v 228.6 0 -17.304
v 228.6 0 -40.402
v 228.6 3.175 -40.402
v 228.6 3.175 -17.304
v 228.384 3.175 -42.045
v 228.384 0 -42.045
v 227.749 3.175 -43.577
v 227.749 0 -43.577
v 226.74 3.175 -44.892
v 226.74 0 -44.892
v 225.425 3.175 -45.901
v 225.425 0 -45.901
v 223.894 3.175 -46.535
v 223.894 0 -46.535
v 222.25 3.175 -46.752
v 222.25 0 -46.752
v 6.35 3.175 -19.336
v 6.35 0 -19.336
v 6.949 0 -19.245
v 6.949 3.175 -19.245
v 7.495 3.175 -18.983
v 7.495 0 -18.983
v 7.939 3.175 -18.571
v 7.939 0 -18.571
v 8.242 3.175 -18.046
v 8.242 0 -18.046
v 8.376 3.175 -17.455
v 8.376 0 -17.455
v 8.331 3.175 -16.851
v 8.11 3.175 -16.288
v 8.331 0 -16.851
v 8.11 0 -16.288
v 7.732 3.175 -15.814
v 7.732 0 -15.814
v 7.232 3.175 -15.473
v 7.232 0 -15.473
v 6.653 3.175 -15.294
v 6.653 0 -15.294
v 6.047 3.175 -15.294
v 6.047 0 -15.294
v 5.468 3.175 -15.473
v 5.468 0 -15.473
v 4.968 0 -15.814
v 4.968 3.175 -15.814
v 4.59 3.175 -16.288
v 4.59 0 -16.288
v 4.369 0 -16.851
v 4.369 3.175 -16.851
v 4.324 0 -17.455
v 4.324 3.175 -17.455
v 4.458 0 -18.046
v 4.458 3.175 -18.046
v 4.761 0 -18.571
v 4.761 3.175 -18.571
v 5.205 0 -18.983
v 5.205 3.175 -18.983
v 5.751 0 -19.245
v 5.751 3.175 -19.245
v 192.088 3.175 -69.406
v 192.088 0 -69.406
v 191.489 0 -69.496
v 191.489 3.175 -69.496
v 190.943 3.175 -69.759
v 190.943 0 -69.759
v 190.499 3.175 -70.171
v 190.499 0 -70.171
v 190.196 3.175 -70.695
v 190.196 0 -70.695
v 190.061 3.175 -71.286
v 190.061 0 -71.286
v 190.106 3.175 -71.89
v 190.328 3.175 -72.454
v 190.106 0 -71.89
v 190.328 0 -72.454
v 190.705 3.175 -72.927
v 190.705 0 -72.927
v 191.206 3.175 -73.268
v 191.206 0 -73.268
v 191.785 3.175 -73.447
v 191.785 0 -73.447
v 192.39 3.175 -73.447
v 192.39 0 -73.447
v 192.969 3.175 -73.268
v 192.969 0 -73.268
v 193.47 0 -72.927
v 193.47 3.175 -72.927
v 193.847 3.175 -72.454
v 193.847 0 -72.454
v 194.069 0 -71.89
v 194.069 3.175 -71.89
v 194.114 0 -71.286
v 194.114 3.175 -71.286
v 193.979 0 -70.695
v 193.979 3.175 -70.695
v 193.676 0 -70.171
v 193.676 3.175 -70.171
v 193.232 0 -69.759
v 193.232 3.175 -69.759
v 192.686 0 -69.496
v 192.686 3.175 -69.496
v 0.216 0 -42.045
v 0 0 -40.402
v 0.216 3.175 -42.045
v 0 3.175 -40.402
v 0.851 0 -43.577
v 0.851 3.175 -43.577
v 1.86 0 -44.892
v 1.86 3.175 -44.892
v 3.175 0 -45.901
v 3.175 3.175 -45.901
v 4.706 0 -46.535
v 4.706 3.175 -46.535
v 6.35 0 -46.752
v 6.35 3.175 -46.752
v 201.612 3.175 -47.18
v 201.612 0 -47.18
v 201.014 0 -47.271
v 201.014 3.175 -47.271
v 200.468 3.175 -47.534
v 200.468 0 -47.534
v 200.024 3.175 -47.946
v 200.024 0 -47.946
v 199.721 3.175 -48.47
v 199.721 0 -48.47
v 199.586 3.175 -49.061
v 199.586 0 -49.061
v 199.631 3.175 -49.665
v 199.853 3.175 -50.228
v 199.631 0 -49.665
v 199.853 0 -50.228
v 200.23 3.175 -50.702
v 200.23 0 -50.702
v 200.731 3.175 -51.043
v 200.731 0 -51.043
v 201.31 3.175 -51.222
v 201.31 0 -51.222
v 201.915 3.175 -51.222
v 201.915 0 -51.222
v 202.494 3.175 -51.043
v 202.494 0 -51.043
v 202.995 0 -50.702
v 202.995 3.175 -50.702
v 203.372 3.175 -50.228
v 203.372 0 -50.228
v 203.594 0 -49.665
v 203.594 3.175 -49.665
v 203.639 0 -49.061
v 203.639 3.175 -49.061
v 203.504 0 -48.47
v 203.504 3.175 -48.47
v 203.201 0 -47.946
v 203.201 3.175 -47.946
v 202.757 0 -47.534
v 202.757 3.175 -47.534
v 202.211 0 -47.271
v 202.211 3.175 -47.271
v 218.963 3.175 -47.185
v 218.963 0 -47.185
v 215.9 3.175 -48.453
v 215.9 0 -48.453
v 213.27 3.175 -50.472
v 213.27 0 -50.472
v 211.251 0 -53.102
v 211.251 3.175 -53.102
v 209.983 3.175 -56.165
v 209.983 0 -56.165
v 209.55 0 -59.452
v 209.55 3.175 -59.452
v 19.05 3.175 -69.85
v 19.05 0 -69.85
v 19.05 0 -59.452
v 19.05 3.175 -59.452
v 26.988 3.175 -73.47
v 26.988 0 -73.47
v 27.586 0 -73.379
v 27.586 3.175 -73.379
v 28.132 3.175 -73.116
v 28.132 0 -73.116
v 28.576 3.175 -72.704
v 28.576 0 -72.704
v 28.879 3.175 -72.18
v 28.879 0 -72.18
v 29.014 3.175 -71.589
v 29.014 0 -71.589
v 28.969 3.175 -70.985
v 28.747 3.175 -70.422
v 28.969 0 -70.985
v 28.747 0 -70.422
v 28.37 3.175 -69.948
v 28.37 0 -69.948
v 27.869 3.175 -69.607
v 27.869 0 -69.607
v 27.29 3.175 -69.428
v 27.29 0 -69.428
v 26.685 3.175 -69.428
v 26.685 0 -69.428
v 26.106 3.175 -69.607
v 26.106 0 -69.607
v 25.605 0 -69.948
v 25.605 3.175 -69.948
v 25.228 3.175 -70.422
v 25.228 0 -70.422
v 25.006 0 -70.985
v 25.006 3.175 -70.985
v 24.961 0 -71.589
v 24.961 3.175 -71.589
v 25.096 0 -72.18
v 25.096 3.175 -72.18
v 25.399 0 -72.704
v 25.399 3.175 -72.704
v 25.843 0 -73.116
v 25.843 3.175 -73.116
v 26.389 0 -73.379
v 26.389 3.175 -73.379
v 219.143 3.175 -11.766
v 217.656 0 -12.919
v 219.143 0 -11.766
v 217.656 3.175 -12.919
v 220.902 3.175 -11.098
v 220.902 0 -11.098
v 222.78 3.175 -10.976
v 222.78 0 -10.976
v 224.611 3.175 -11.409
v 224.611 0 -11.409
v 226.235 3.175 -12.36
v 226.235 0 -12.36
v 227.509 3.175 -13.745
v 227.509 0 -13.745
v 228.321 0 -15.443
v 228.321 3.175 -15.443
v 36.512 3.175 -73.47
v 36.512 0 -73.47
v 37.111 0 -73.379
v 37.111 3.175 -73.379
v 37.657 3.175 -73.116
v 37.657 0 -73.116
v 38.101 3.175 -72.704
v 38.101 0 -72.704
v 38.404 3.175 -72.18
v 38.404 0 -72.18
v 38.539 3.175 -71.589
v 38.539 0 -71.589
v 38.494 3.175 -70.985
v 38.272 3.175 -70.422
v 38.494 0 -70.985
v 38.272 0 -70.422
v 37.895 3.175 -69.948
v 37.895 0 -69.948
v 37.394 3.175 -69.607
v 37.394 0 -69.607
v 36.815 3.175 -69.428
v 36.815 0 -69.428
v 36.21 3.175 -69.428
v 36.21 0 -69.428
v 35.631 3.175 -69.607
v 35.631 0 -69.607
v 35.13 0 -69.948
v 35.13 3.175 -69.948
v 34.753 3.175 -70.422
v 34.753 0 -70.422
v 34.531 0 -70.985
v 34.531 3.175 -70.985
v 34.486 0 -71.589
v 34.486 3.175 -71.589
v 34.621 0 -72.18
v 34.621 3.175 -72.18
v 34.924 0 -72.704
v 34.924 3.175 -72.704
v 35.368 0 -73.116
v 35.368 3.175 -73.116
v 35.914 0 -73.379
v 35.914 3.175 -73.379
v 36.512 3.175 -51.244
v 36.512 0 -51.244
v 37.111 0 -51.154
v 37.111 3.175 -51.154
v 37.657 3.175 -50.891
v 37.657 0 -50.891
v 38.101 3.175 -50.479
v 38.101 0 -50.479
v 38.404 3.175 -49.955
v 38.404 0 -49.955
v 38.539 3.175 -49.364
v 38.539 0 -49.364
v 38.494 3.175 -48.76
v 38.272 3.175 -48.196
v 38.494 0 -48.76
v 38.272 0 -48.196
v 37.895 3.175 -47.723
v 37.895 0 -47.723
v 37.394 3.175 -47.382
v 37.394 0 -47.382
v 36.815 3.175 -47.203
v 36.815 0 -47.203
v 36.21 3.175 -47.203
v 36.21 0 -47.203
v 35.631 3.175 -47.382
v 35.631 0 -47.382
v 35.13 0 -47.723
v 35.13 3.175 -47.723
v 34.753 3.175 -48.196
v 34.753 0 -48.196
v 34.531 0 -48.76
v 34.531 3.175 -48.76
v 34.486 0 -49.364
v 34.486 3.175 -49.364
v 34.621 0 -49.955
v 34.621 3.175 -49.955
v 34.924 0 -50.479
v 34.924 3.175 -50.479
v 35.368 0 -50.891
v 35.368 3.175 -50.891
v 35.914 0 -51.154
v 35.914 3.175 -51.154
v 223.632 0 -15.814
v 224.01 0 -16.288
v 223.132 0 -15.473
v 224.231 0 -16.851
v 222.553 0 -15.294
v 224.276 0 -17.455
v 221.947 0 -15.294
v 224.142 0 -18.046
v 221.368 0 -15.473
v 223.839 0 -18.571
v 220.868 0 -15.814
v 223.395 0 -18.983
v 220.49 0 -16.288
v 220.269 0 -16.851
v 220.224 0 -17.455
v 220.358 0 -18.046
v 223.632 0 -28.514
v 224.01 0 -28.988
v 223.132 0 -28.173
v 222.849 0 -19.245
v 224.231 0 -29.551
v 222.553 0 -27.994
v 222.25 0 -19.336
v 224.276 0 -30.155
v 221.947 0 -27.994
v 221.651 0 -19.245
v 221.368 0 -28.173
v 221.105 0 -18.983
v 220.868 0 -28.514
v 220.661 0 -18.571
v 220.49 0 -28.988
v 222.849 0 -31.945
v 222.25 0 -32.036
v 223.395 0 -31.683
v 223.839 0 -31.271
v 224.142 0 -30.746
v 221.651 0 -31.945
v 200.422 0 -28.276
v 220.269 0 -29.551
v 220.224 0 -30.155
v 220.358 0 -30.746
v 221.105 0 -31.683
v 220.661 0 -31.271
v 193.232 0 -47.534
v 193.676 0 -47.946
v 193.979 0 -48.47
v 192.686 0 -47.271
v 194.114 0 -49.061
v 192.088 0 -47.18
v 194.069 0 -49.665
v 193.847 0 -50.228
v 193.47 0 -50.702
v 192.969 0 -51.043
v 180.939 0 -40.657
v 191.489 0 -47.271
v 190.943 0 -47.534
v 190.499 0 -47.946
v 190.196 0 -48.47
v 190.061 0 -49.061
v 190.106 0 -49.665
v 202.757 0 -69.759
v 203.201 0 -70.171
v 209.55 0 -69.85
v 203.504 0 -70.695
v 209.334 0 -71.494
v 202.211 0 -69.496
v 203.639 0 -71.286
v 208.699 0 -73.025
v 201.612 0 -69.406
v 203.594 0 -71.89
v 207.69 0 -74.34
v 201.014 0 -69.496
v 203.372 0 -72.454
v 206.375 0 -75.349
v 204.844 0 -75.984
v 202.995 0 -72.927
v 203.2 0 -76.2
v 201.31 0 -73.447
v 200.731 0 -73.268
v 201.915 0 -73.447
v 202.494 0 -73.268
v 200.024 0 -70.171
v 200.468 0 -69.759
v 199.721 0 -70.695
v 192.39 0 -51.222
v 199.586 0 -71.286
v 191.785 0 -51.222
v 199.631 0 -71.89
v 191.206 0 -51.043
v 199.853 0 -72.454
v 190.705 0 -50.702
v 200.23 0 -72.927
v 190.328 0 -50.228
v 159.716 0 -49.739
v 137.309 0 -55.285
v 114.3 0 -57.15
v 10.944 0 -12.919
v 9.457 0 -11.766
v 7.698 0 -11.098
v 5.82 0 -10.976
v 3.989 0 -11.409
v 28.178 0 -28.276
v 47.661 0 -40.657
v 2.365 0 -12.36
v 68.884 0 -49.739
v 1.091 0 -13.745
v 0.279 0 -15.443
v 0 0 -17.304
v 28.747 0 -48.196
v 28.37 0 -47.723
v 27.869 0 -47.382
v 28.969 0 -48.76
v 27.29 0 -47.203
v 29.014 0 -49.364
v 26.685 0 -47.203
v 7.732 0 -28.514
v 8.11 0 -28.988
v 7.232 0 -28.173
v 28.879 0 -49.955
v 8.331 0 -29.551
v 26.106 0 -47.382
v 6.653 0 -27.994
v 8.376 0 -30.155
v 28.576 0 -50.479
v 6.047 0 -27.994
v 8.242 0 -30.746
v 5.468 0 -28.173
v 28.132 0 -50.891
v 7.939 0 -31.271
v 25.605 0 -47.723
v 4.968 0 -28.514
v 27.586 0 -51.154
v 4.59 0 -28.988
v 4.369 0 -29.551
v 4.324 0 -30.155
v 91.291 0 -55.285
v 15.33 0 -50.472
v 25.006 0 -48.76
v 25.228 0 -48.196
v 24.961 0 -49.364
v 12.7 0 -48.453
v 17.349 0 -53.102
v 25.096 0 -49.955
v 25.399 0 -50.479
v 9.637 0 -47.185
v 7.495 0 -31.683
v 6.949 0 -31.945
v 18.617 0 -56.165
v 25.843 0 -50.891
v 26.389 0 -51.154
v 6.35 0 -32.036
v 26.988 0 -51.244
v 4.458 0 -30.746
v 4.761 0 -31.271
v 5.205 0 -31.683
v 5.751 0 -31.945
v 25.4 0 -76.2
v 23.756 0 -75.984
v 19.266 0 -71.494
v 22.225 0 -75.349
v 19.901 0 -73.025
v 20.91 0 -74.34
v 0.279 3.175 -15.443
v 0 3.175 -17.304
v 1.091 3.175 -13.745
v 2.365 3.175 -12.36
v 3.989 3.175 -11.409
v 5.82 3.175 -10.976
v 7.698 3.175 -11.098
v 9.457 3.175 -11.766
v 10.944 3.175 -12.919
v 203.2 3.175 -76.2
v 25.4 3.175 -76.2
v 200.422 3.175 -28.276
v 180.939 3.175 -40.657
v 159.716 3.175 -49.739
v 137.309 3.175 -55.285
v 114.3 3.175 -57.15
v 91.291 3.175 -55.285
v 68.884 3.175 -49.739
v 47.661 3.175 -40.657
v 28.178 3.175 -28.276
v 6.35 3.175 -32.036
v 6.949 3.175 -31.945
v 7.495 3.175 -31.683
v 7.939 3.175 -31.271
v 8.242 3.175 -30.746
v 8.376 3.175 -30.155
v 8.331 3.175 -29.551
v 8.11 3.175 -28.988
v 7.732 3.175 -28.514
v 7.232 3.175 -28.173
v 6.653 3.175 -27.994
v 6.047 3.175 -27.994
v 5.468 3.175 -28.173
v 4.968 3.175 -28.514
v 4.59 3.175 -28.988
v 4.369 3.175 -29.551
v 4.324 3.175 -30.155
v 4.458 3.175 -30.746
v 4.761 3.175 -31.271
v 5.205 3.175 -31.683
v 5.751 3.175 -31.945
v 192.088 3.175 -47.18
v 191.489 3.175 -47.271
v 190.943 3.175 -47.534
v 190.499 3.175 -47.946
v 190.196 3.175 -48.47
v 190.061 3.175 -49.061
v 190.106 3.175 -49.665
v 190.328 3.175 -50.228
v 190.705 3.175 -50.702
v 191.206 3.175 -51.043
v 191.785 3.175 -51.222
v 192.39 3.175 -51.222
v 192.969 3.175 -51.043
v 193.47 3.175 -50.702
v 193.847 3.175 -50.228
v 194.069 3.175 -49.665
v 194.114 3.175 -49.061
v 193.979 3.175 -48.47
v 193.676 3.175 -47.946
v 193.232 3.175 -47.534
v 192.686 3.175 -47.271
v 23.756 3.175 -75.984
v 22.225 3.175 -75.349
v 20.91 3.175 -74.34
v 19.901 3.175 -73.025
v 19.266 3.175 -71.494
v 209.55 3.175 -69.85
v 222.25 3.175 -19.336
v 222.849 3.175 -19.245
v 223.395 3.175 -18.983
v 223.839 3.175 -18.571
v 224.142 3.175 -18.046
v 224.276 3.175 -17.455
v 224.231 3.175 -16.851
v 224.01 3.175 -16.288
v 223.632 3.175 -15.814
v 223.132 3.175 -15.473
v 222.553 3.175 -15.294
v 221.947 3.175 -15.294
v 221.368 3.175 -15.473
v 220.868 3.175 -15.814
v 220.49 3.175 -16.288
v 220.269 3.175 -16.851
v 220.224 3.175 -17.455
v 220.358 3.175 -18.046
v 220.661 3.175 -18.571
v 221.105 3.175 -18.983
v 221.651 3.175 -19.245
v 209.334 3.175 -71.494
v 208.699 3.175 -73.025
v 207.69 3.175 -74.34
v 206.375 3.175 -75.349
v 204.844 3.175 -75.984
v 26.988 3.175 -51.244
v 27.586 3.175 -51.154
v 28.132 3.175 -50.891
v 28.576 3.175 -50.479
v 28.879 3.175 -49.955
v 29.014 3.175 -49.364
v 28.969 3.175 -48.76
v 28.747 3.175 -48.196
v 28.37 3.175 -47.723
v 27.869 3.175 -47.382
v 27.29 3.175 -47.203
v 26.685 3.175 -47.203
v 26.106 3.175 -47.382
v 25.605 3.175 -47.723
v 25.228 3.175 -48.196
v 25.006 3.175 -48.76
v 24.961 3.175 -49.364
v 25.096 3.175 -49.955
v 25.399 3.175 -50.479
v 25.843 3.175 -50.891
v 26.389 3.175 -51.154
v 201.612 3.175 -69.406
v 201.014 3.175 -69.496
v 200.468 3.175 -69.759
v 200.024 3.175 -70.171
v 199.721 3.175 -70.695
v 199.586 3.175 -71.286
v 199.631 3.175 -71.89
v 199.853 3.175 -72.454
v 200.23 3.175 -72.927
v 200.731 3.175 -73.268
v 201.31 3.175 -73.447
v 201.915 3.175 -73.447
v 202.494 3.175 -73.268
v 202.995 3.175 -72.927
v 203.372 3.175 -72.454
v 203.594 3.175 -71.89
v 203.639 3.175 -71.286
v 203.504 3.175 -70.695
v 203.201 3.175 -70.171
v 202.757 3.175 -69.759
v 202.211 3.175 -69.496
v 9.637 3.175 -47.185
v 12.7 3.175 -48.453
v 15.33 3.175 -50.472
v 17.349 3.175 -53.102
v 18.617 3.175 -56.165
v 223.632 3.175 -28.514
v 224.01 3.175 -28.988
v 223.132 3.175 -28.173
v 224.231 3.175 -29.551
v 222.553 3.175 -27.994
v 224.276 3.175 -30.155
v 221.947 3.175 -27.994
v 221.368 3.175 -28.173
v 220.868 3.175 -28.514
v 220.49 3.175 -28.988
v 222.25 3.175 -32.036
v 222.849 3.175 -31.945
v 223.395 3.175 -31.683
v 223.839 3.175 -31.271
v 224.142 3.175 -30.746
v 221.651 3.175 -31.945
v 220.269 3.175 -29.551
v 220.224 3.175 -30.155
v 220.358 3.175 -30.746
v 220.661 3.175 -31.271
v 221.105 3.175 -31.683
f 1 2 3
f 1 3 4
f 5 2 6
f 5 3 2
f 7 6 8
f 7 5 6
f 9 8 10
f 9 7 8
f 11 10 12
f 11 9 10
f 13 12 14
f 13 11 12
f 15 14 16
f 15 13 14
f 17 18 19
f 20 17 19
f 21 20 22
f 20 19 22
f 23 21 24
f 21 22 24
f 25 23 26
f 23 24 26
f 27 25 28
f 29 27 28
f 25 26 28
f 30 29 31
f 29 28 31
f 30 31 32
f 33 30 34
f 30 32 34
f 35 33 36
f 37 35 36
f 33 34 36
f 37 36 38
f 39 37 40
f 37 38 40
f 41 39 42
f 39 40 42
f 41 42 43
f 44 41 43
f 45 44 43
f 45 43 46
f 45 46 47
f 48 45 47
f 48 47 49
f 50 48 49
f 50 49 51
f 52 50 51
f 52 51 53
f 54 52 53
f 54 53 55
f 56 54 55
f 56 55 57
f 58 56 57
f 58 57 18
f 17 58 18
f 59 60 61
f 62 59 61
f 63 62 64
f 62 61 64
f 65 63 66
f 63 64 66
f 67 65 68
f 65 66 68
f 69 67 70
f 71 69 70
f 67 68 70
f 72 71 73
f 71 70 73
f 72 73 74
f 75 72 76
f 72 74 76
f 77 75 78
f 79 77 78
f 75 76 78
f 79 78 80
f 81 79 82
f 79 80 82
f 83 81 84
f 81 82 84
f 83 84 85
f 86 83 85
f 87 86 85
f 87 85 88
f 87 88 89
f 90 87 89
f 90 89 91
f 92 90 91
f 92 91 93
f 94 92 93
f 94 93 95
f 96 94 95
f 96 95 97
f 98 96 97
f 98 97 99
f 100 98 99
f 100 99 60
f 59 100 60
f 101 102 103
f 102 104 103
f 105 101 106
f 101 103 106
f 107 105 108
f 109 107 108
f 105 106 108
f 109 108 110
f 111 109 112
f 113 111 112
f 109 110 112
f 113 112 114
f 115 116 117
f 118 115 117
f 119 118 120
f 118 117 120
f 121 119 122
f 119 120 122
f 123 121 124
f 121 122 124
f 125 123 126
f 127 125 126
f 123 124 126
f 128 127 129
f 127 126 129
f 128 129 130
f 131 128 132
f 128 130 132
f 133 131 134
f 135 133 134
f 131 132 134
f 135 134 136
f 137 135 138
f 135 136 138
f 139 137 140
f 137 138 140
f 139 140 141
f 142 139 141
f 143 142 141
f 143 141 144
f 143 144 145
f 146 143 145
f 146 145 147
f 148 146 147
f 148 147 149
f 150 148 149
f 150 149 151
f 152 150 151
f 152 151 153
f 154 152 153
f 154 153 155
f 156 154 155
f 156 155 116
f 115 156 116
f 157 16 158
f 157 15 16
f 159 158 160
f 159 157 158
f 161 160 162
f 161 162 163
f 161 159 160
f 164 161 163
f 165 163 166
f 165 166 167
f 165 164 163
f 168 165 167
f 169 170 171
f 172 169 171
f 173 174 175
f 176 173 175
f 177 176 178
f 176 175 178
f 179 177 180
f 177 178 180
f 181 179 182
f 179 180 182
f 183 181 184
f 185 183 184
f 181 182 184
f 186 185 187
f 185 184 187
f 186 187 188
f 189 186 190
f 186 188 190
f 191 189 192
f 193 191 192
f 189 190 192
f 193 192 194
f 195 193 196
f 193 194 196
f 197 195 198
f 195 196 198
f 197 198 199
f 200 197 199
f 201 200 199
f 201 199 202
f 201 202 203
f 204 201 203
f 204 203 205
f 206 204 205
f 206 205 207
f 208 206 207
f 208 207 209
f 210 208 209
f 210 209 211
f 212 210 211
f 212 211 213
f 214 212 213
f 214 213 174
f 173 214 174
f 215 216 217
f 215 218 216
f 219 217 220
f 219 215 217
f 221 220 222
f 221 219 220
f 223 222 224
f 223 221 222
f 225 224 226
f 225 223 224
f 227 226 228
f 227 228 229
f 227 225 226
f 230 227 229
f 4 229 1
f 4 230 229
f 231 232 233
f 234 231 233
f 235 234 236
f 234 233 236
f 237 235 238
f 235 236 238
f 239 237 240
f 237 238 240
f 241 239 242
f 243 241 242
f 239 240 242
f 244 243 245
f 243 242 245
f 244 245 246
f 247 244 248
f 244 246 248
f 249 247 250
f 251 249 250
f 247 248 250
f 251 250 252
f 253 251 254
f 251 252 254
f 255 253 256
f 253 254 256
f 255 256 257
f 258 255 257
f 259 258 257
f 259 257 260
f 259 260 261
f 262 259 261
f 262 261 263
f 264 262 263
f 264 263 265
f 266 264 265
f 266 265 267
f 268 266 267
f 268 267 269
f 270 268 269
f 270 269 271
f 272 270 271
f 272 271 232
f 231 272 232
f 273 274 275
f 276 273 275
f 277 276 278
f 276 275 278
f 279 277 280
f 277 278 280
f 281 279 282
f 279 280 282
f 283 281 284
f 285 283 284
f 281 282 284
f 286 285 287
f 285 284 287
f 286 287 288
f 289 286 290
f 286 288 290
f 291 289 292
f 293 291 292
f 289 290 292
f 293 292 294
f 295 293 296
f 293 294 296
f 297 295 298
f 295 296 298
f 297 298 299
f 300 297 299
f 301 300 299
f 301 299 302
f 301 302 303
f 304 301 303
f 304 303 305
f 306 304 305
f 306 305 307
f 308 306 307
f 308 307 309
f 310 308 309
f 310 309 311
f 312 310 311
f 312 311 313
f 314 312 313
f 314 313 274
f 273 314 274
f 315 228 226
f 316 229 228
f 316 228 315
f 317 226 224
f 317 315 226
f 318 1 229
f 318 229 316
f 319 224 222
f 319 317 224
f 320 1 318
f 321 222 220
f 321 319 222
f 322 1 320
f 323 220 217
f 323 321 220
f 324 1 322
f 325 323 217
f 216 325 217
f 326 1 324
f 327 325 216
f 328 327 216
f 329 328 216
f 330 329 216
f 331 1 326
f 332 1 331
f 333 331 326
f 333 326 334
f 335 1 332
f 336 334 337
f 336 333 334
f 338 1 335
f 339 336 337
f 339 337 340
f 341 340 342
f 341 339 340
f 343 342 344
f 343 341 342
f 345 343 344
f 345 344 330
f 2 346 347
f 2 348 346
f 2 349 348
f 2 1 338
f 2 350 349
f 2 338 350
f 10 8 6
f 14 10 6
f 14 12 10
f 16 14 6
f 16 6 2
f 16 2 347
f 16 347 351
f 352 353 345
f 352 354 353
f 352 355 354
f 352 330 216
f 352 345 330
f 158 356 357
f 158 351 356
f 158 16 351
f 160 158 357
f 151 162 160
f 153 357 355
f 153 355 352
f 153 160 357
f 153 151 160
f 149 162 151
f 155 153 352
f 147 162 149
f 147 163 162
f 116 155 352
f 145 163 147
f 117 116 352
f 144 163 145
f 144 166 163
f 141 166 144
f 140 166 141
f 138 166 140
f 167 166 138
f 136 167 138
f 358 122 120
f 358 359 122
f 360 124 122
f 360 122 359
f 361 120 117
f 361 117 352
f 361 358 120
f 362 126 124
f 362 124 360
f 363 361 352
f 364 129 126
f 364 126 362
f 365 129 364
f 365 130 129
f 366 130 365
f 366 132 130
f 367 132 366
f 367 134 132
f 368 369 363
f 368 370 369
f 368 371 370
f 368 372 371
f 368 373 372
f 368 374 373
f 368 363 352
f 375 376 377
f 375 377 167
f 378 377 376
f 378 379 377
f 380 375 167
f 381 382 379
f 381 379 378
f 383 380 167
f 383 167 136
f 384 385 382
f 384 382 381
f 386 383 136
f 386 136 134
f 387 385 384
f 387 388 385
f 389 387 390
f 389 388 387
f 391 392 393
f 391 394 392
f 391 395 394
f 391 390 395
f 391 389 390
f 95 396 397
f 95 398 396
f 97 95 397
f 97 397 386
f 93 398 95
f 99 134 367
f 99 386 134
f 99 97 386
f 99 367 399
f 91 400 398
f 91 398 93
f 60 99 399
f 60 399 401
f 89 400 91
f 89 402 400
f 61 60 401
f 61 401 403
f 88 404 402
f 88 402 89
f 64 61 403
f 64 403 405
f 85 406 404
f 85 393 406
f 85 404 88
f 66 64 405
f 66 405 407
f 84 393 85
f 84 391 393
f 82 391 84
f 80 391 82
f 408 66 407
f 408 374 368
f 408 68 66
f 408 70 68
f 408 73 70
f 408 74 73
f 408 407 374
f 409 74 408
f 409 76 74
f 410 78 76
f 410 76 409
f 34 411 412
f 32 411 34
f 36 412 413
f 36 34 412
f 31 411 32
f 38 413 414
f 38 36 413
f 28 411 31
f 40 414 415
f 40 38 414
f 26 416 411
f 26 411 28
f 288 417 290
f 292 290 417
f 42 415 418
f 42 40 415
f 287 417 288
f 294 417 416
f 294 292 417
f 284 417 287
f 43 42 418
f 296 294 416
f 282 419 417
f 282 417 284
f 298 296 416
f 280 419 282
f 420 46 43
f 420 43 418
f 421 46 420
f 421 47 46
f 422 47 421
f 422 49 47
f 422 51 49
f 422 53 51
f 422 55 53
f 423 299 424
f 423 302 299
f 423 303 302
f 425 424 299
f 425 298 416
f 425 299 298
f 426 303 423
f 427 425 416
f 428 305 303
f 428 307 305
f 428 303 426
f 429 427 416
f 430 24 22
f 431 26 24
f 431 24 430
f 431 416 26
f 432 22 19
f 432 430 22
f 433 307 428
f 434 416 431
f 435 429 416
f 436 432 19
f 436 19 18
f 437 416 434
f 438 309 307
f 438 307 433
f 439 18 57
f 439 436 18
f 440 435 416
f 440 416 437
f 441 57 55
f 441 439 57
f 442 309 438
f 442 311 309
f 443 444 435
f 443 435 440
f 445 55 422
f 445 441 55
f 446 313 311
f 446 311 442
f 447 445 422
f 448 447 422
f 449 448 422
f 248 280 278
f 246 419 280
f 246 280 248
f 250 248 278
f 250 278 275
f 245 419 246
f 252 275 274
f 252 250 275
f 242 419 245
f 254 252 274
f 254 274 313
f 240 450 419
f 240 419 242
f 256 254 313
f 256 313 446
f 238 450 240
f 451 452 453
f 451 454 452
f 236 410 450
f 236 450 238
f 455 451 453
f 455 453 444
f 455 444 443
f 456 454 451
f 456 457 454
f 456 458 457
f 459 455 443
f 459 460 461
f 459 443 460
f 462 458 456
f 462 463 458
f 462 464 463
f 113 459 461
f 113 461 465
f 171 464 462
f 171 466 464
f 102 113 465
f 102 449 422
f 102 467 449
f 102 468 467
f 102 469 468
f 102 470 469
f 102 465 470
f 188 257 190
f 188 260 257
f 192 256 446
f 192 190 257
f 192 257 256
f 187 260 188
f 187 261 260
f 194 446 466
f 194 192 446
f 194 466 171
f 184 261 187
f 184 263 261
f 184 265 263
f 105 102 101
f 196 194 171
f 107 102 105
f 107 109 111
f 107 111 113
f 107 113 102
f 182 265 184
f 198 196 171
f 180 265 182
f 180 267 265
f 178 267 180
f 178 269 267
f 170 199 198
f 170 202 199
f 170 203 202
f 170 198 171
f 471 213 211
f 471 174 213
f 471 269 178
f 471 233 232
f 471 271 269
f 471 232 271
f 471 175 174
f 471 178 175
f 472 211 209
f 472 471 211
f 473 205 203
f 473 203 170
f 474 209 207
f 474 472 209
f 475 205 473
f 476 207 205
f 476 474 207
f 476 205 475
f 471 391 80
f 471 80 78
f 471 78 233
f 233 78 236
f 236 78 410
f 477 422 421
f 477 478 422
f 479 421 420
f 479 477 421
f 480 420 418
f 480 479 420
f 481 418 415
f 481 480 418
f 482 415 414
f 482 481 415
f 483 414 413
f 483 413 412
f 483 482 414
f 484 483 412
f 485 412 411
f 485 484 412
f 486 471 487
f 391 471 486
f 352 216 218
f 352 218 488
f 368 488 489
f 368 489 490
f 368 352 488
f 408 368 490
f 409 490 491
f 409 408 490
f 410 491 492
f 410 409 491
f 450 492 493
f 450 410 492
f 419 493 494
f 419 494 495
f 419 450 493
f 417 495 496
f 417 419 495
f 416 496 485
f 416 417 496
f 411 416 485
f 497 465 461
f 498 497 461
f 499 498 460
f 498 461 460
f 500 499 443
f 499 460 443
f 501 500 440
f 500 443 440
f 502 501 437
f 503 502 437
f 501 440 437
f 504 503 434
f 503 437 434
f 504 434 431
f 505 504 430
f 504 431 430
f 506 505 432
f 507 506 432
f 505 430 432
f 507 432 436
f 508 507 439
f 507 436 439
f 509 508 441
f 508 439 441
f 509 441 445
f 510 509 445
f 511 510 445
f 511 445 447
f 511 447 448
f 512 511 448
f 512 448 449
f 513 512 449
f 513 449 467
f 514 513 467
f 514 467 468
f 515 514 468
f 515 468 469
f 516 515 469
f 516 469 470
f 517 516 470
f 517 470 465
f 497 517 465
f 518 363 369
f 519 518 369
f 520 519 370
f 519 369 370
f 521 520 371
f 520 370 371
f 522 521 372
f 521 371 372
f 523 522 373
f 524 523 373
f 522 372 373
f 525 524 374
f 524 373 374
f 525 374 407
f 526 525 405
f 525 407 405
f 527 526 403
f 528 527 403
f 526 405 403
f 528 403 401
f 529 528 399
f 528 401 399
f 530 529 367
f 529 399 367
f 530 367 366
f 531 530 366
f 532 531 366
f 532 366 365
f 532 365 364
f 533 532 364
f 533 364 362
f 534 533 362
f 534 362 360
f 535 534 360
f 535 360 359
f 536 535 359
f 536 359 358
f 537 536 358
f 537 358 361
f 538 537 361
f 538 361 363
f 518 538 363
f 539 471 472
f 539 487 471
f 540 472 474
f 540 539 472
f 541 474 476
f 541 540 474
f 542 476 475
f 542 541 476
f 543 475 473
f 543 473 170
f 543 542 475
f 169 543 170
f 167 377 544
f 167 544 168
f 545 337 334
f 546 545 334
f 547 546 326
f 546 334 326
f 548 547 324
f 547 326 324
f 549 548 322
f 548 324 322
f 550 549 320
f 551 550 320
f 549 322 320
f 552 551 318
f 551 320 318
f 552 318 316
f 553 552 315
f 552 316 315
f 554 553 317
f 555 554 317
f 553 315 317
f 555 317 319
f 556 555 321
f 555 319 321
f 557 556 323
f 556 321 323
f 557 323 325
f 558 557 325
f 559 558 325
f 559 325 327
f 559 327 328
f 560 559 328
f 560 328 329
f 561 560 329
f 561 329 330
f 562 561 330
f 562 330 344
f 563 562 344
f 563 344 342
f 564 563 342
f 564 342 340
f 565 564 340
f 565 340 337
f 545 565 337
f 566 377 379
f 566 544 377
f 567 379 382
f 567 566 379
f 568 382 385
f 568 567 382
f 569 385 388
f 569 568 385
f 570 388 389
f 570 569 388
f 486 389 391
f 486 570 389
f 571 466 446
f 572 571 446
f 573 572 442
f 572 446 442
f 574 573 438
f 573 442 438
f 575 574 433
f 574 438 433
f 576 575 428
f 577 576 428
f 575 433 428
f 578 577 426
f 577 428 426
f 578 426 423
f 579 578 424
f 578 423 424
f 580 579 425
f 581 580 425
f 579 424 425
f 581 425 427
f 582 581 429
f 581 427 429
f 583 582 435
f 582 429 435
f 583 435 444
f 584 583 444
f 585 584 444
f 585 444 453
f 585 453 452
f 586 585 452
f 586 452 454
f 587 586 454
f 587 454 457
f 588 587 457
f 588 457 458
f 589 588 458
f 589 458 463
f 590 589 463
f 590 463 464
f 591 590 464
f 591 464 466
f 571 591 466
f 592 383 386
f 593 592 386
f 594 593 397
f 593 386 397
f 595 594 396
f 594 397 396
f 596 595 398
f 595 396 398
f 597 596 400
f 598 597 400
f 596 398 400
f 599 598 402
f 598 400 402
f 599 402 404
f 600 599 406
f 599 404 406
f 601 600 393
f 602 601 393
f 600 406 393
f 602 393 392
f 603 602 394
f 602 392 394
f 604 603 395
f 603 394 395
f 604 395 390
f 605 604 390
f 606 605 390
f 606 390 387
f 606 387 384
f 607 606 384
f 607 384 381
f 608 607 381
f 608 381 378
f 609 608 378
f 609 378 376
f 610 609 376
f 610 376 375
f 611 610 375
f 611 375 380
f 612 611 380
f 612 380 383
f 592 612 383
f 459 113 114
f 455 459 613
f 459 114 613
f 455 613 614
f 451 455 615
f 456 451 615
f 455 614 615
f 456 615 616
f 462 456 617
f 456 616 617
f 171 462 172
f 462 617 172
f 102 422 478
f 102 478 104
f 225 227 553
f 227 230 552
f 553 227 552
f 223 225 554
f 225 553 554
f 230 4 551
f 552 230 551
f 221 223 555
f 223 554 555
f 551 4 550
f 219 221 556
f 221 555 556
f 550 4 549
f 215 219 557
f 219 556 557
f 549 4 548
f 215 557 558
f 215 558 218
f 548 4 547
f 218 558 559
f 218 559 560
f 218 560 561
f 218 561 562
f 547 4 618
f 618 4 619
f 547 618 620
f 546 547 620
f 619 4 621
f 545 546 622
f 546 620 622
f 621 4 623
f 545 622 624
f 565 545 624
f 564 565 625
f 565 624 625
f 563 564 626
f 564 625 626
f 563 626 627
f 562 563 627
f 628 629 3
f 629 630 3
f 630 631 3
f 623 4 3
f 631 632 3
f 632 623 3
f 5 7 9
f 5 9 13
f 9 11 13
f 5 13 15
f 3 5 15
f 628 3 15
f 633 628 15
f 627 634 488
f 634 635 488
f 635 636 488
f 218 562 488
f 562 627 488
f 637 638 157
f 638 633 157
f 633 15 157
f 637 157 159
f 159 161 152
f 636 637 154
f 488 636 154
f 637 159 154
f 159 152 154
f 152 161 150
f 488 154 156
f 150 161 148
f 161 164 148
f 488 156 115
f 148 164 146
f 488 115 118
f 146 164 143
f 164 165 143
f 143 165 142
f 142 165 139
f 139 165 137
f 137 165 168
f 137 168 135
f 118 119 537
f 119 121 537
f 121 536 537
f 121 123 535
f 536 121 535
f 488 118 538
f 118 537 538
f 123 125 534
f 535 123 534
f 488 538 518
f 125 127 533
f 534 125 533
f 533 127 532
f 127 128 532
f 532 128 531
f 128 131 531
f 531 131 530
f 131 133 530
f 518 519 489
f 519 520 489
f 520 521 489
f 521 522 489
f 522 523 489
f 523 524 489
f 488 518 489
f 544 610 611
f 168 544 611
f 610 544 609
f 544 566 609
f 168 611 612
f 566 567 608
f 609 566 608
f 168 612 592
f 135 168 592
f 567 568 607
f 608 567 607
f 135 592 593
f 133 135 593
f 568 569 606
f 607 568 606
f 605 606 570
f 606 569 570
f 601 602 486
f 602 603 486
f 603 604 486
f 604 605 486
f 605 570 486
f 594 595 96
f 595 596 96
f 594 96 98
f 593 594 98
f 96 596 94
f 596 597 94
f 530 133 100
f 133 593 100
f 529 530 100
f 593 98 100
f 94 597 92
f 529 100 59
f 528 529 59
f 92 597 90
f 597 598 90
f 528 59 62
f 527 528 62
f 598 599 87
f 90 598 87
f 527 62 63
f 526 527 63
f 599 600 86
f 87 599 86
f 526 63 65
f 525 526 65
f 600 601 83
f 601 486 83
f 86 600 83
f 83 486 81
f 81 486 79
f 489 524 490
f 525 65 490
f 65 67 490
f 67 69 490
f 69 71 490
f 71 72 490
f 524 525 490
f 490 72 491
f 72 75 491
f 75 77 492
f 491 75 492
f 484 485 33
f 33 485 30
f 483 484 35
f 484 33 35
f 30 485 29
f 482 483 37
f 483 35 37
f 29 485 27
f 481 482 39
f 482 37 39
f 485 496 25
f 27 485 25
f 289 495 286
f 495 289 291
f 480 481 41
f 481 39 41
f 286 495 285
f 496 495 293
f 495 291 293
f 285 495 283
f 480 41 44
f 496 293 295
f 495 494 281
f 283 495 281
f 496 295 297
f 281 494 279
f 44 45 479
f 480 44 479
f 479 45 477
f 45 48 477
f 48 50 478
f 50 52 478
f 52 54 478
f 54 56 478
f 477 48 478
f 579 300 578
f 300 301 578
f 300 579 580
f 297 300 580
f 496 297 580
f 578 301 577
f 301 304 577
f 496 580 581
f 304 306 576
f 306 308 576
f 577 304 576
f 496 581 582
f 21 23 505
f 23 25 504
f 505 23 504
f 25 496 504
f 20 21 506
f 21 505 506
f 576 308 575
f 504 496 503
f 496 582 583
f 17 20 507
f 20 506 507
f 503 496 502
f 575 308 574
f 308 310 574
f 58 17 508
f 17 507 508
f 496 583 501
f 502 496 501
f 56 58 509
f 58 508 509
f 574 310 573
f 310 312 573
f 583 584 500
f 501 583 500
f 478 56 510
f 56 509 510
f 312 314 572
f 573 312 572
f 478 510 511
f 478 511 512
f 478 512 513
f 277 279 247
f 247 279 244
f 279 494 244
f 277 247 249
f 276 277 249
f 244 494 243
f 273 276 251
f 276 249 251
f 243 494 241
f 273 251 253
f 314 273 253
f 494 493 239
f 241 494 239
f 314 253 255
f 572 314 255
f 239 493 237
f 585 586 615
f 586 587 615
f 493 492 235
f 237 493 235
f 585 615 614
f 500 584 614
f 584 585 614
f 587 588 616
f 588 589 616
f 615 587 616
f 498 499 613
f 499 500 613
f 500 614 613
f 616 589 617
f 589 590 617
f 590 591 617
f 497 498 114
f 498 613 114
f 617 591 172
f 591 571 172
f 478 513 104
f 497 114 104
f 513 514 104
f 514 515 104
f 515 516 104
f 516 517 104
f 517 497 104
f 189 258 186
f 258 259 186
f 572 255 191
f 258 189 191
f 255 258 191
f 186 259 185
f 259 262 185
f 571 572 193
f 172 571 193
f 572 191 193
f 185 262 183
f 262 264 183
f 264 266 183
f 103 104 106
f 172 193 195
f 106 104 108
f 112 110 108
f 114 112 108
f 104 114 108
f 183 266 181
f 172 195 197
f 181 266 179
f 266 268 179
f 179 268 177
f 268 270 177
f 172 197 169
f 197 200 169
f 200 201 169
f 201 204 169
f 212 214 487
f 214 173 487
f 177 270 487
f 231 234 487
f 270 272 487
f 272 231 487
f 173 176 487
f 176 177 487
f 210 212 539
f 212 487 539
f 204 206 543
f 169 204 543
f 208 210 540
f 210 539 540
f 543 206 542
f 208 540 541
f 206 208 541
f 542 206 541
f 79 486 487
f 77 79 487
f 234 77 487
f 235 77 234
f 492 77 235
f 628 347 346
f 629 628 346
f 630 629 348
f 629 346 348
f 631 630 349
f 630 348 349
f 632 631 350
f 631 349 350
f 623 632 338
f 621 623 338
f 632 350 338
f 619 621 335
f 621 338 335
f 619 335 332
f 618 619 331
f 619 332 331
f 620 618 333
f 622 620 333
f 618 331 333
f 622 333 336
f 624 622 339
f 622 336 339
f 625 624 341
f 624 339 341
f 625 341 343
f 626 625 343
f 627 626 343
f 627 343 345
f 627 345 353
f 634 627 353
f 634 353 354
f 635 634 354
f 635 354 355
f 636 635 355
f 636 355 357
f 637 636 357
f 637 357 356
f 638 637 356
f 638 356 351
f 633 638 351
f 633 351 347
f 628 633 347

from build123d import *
from OCP.BRepFilletAPI import BRepFilletAPI_MakeFillet

# Parameters (mm, degrees)
BOSS_EXTRUDE1_DEPTH = 3.175
SKETCH3_R           = 2.032
CUT_EXTRUDE1_DEPTH  = 241.986473946
FILLET1_R           = 6.35
SKETCH4_R           = 2.032
SKETCH4_W           = 19.05
SKETCH4_H           = 29.448186152
CUT_EXTRUDE2_DEPTH  = 241.986473946
FILLET2_R           = 12.7
FILLET2_R_2         = 6.35


with BuildPart() as part:
    # Sketch1 → Boss-Extrude1 (new body)
    with BuildSketch(Plane(origin=(0, 0, 0), x_dir=(1, 0, 0), z_dir=(0, 1, 0))):
        with BuildLine():
            Line((0, 0), (0, 76.2))
            Line((0, 76.2), (228.6, 76.2))
            Line((228.6, 76.2), (228.6, 0))
            ThreePointArc((228.6, 0), (114.3, 57.15), (0, 0))
        make_face()
    extrude(amount=BOSS_EXTRUDE1_DEPTH)

    # Sketch3 → Cut-Extrude1 (cut, through all)
    with BuildSketch(Plane.XZ):
        with Locations(Location((36.5125, -49.2125, 0), (0, 0, 270))):
            Circle(SKETCH3_R)
        with Locations(Location((26.9875, -49.2125, 0), (0, 0, 270))):
            Circle(SKETCH3_R)
        with Locations(Location((201.6125, -49.2125, 0), (0, 0, 90))):
            Circle(SKETCH3_R)
        with Locations(Location((192.0875, -49.2125, 0), (0, 0, 90))):
            Circle(SKETCH3_R)
        with Locations(Location((36.5125, -71.4375, 0), (0, 0, 270))):
            Circle(SKETCH3_R)
        with Locations(Location((26.9875, -71.4375, 0), (0, 0, 270))):
            Circle(SKETCH3_R)
        with Locations(Location((201.6125, -71.4375, 0), (0, 0, 90))):
            Circle(SKETCH3_R)
        with Locations(Location((192.0875, -71.4375, 0), (0, 0, 90))):
            Circle(SKETCH3_R)
    extrude(amount=-CUT_EXTRUDE1_DEPTH, mode=Mode.SUBTRACT)

    # Fillet1
    fillet1_edges = [part.edges().sort_by_distance(p)[0] for p in [
        (0, 1.5875, 0),
        (228.6, 1.5875, 0),
    ]]
    fillet(fillet1_edges, radius=FILLET1_R)

    # Sketch4 → Cut-Extrude2 (cut, through all)
    with BuildSketch(Plane.XZ):
        with Locations(Location((6.35, -17.303627696, 0), (0, 0, 270))):
            Circle(SKETCH4_R)
        with Locations(Location((6.35, -30.003627696, 0), (0, 0, 270))):
            Circle(SKETCH4_R)
        with Locations(Location((222.25, -17.303627696, 0), (0, 0, 270))):
            Circle(SKETCH4_R)
        with Locations(Location((222.25, -30.003627696, 0), (0, 0, 270))):
            Circle(SKETCH4_R)
        with Locations((9.525, -61.475906924)):
            Rectangle(SKETCH4_W, SKETCH4_H)
        with Locations((219.075, -61.475906924)):
            Rectangle(SKETCH4_W, SKETCH4_H)
    extrude(amount=-CUT_EXTRUDE2_DEPTH, mode=Mode.SUBTRACT)

    # Fillet2
    fillet2_edges_1 = [part.edges().sort_by_distance(p)[0] for p in [
        (209.55, 1.5875, -46.751813848),
        (19.05, 1.5875, -46.751813848),
    ]]
    fillet2_edges_2 = [part.edges().sort_by_distance(p)[0] for p in [
        (228.6, 1.5875, -46.751813848),
        (209.55, 1.5875, -76.2),
        (0, 1.5875, -46.751813848),
        (19.05, 1.5875, -76.2),
    ]]
    fillet2 = BRepFilletAPI_MakeFillet(part.part.solid().wrapped)
    for e in fillet2_edges_1:
        fillet2.Add(FILLET2_R - 0.0001, e.wrapped)
    for e in fillet2_edges_2:
        fillet2.Add(FILLET2_R_2 - 0.0001, e.wrapped)
    add(Compound.cast(fillet2.Shape()), mode=Mode.REPLACE)  # a hair under: the kernel refuses the full size


solid = part.part
